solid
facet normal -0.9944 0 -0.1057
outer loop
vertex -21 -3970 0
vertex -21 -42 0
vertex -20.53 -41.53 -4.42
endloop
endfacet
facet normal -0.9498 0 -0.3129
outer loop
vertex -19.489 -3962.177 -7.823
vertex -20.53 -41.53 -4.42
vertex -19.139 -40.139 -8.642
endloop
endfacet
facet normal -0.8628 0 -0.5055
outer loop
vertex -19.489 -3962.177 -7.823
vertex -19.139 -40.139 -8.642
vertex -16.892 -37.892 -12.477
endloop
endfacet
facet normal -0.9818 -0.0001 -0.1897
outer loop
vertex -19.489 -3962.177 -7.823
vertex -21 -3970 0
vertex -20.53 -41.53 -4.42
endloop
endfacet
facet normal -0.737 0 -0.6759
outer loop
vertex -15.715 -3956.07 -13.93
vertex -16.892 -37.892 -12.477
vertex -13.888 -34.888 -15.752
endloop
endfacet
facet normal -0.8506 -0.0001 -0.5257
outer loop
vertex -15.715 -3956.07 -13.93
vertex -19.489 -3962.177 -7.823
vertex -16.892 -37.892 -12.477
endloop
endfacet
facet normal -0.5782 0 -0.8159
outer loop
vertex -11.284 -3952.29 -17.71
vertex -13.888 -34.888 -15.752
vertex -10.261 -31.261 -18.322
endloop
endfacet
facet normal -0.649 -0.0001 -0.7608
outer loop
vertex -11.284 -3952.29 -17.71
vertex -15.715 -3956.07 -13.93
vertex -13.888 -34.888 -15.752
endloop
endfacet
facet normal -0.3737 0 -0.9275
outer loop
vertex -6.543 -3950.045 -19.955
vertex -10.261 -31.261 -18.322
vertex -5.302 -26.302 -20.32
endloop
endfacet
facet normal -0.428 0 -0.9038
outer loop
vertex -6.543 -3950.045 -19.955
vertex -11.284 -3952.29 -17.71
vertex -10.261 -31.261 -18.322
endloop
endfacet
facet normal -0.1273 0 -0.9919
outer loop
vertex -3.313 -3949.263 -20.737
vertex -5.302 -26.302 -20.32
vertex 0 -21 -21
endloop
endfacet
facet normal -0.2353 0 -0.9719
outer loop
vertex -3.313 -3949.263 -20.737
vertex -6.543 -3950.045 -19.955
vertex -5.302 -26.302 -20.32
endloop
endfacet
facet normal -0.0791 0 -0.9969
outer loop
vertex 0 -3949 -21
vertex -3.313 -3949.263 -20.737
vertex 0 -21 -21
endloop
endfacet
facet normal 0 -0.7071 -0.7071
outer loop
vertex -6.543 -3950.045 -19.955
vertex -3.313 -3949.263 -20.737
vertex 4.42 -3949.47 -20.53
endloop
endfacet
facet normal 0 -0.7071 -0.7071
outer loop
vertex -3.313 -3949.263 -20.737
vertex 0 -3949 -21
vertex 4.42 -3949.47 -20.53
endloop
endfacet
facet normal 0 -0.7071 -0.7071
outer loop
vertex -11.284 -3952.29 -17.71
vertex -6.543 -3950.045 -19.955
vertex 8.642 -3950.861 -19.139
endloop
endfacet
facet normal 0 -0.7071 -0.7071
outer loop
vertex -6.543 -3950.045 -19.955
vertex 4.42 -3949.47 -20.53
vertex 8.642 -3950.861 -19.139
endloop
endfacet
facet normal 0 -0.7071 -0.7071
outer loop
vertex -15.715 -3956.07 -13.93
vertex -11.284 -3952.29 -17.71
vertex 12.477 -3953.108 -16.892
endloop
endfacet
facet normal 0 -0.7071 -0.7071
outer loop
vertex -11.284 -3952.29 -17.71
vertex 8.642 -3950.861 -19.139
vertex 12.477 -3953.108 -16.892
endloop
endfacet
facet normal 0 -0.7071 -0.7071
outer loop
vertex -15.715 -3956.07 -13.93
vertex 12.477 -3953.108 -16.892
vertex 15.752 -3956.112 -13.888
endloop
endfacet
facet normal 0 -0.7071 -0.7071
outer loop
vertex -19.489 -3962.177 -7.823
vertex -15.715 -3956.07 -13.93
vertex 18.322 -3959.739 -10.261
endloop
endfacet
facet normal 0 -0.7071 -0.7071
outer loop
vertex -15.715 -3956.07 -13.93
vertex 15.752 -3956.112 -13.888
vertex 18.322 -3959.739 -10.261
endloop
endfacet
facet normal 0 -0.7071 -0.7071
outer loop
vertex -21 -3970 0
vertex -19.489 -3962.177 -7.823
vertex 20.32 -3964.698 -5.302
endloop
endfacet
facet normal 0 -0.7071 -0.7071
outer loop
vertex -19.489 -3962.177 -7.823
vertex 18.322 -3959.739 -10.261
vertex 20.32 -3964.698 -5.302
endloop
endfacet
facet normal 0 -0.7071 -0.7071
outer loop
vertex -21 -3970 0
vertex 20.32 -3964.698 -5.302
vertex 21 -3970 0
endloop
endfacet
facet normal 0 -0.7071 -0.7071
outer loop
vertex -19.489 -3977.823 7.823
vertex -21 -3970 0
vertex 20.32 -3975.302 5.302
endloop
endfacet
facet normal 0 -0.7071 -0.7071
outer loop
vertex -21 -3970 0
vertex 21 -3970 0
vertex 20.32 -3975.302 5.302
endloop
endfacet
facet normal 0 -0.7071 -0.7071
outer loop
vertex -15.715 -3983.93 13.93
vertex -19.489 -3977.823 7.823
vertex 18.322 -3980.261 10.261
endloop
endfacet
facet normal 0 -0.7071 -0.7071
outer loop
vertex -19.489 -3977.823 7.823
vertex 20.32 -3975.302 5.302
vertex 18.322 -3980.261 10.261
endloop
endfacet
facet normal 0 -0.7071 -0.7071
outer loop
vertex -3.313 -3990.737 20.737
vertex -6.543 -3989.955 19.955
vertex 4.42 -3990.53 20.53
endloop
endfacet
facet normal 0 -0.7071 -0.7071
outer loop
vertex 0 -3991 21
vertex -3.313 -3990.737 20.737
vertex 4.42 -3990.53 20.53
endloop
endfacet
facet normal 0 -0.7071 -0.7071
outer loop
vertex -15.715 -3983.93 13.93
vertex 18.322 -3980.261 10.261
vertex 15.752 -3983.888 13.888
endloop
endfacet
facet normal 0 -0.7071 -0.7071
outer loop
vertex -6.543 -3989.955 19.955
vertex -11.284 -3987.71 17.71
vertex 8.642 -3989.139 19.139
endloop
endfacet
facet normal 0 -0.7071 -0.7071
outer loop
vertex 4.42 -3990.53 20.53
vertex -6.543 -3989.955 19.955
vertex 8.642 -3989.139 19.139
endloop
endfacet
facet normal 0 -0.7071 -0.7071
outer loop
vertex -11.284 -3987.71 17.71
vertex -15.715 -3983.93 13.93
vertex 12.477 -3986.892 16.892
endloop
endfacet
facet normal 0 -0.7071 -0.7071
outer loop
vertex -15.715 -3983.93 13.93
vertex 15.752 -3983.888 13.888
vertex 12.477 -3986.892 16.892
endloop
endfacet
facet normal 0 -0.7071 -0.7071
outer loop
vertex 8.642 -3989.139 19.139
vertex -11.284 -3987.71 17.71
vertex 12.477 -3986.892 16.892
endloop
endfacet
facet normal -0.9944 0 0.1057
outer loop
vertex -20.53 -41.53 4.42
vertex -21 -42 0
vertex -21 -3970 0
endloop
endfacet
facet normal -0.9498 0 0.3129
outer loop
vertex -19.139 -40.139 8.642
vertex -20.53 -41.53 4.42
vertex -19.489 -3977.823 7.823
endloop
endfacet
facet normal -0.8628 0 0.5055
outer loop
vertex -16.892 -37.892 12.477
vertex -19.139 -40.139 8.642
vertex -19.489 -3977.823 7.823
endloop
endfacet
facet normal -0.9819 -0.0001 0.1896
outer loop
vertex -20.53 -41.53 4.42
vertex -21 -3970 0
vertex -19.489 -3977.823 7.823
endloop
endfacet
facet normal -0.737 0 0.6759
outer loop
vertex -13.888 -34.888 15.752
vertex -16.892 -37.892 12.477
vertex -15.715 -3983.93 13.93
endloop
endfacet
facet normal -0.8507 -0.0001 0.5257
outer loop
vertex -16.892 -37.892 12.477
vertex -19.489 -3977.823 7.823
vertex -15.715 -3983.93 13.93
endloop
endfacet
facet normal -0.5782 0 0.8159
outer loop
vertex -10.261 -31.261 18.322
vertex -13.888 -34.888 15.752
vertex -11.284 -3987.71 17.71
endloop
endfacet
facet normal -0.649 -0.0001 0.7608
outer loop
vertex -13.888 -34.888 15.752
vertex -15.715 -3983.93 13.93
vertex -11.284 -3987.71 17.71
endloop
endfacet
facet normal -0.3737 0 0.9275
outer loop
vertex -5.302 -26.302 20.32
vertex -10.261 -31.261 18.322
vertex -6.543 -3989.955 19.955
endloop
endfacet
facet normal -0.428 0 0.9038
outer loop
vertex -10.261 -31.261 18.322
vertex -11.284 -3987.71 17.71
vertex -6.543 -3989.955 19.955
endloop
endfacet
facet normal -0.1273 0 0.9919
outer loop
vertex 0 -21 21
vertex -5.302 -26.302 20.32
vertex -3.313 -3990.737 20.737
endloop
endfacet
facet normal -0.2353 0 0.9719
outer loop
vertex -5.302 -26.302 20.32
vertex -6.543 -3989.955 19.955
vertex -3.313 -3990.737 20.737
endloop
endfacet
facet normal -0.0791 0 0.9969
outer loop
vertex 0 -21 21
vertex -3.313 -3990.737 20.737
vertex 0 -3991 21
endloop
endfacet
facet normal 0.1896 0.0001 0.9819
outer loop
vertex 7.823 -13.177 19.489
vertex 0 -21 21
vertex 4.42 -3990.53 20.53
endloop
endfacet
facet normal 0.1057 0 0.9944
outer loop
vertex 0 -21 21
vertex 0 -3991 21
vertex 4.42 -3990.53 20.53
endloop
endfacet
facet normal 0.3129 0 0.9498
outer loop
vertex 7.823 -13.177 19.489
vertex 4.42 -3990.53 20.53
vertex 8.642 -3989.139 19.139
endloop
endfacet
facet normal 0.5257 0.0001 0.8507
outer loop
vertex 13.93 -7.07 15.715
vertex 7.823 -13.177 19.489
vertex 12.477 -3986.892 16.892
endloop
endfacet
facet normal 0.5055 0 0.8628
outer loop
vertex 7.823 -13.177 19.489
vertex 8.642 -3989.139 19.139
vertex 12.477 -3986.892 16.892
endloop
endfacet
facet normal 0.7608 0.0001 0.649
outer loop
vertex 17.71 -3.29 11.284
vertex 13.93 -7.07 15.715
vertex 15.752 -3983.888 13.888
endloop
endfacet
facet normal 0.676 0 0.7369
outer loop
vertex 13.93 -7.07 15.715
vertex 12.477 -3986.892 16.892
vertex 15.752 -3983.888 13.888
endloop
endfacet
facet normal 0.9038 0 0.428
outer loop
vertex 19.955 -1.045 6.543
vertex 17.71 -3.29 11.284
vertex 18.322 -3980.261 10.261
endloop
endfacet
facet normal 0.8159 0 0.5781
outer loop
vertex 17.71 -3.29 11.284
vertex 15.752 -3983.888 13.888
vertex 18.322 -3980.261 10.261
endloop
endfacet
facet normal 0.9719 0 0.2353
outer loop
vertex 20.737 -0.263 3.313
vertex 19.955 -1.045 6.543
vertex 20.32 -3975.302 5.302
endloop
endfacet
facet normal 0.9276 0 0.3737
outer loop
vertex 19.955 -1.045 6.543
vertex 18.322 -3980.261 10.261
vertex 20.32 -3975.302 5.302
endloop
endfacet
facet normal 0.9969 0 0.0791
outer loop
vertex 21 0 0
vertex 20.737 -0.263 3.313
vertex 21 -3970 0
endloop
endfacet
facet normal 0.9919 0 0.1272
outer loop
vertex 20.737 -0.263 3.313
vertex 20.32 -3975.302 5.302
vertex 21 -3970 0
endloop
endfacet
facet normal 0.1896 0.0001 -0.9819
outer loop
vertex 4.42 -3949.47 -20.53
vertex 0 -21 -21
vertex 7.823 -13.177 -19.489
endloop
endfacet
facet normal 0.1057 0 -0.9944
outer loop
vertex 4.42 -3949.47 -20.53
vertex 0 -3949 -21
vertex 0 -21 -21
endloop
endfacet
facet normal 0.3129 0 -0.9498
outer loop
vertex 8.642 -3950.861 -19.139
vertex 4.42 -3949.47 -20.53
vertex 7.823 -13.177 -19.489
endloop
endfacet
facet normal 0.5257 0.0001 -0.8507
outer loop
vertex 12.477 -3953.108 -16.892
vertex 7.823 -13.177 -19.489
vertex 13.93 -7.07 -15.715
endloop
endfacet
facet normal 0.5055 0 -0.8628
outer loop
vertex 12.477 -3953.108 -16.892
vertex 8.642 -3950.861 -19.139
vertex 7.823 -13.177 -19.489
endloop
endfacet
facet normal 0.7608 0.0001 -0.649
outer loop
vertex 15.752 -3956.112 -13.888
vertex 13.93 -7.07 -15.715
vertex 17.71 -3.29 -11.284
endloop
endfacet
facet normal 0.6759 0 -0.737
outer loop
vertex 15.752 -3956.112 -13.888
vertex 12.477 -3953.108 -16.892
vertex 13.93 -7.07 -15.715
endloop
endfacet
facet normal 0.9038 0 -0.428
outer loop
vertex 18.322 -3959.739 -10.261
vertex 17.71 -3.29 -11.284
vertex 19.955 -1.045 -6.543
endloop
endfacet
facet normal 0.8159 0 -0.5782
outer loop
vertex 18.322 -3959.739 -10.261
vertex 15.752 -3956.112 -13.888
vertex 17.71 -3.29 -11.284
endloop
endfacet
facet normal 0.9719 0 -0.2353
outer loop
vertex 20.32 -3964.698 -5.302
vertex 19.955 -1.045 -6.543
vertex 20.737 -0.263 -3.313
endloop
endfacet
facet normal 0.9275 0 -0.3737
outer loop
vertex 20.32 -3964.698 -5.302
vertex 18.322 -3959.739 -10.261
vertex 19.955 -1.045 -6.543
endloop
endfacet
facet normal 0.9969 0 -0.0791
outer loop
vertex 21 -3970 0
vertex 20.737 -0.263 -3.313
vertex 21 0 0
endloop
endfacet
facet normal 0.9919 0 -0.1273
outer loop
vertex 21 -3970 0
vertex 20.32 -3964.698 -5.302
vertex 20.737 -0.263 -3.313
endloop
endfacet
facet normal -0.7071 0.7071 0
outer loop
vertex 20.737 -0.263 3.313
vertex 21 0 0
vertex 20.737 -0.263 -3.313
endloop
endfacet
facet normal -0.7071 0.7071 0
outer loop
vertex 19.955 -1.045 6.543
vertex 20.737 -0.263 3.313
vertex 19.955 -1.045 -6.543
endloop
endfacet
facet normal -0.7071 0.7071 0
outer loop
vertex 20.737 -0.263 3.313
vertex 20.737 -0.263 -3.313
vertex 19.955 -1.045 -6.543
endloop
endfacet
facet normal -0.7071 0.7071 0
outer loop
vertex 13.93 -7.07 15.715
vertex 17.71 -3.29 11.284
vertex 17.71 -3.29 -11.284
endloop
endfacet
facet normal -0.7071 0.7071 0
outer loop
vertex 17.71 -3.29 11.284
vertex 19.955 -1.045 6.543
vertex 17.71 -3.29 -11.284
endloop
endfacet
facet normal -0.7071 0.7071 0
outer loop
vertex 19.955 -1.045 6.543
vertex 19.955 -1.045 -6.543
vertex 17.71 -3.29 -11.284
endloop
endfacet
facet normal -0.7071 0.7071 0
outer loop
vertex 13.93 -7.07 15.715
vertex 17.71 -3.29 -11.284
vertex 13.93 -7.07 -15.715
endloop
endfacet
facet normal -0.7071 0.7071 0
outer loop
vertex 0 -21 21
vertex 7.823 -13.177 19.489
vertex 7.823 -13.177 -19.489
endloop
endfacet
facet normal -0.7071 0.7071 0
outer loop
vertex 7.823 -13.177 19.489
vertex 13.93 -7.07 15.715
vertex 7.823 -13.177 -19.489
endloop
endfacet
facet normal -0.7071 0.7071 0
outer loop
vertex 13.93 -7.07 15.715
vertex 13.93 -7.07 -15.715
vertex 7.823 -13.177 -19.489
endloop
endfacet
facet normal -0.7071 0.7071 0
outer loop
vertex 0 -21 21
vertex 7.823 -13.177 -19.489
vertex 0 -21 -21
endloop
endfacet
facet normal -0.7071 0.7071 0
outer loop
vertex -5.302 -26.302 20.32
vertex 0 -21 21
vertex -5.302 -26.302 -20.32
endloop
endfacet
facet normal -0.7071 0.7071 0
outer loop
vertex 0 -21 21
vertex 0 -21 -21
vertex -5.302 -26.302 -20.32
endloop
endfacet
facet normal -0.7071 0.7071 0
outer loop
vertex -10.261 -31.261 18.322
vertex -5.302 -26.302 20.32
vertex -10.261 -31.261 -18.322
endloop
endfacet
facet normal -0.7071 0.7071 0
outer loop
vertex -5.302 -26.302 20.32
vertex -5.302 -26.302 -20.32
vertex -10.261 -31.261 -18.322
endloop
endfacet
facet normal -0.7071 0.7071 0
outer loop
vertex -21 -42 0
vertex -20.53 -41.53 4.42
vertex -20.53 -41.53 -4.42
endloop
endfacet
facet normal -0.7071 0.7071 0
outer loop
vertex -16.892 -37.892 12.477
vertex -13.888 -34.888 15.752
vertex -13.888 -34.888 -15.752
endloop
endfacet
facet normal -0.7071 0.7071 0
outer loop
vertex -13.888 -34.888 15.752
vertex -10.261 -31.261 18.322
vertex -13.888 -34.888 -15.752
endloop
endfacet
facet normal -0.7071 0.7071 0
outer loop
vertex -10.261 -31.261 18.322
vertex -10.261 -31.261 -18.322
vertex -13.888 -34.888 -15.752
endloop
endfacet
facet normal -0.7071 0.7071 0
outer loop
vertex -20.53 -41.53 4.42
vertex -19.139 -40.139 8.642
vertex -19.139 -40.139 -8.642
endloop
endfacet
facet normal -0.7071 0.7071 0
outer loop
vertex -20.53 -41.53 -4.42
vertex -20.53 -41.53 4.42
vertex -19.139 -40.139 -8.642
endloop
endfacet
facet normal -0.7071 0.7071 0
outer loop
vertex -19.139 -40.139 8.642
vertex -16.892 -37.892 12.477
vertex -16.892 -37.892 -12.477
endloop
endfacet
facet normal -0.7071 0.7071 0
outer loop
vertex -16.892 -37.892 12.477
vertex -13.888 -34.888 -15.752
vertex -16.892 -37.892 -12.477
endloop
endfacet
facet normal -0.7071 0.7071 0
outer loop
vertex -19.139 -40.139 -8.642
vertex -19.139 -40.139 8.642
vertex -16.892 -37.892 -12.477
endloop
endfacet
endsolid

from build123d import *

# Parameters (mm, degrees)
F0_W     = 42
F0_H     = 42
F1_DEPTH = 3991
F3_DEPTH = 100
F5_DEPTH = 100
F6_R     = 20.99999


# Not quite as in the source:
# - a fillet or chamfer is up to 0.001 mm smaller than in the source, because OpenCascade refuses the exact size


with BuildPart() as f1:
    # F0 (on Front) → F1 (new body)
    with BuildSketch(Plane.XZ):
        Rectangle(F0_W, F0_H)
    extrude(amount=F1_DEPTH)

    # F2 (on face) → F3 (cut)
    with BuildSketch(Plane.YZ.offset(21)):
        Polygon((-3949, -21), (-3991, 21), (-3991, -21), align=None)
    extrude(amount=-F3_DEPTH, mode=Mode.SUBTRACT)

    # F4 (on face) → F5 (cut)
    with BuildSketch(Plane(origin=(0, 0, -21), x_dir=(1, 0, 0), z_dir=(0, 0, -1))):
        Polygon((-21, 0), (21, 0), (-21, 42), align=None)
    extrude(amount=-F5_DEPTH, mode=Mode.SUBTRACT)

    # F6 (radius 21 in the source; OpenCascade refuses exactly that, so slightly less here)
    f6_edges = [f1.edges().sort_by_distance(p)[0] for p in [
        (-21, -1995.5, -21),
        (21, -1974.5, -21),
        (21, -1995.5, 21),
        (-21, -2016.5, 21),
    ]]
    fillet(f6_edges, radius=F6_R)


solid = f1.part
